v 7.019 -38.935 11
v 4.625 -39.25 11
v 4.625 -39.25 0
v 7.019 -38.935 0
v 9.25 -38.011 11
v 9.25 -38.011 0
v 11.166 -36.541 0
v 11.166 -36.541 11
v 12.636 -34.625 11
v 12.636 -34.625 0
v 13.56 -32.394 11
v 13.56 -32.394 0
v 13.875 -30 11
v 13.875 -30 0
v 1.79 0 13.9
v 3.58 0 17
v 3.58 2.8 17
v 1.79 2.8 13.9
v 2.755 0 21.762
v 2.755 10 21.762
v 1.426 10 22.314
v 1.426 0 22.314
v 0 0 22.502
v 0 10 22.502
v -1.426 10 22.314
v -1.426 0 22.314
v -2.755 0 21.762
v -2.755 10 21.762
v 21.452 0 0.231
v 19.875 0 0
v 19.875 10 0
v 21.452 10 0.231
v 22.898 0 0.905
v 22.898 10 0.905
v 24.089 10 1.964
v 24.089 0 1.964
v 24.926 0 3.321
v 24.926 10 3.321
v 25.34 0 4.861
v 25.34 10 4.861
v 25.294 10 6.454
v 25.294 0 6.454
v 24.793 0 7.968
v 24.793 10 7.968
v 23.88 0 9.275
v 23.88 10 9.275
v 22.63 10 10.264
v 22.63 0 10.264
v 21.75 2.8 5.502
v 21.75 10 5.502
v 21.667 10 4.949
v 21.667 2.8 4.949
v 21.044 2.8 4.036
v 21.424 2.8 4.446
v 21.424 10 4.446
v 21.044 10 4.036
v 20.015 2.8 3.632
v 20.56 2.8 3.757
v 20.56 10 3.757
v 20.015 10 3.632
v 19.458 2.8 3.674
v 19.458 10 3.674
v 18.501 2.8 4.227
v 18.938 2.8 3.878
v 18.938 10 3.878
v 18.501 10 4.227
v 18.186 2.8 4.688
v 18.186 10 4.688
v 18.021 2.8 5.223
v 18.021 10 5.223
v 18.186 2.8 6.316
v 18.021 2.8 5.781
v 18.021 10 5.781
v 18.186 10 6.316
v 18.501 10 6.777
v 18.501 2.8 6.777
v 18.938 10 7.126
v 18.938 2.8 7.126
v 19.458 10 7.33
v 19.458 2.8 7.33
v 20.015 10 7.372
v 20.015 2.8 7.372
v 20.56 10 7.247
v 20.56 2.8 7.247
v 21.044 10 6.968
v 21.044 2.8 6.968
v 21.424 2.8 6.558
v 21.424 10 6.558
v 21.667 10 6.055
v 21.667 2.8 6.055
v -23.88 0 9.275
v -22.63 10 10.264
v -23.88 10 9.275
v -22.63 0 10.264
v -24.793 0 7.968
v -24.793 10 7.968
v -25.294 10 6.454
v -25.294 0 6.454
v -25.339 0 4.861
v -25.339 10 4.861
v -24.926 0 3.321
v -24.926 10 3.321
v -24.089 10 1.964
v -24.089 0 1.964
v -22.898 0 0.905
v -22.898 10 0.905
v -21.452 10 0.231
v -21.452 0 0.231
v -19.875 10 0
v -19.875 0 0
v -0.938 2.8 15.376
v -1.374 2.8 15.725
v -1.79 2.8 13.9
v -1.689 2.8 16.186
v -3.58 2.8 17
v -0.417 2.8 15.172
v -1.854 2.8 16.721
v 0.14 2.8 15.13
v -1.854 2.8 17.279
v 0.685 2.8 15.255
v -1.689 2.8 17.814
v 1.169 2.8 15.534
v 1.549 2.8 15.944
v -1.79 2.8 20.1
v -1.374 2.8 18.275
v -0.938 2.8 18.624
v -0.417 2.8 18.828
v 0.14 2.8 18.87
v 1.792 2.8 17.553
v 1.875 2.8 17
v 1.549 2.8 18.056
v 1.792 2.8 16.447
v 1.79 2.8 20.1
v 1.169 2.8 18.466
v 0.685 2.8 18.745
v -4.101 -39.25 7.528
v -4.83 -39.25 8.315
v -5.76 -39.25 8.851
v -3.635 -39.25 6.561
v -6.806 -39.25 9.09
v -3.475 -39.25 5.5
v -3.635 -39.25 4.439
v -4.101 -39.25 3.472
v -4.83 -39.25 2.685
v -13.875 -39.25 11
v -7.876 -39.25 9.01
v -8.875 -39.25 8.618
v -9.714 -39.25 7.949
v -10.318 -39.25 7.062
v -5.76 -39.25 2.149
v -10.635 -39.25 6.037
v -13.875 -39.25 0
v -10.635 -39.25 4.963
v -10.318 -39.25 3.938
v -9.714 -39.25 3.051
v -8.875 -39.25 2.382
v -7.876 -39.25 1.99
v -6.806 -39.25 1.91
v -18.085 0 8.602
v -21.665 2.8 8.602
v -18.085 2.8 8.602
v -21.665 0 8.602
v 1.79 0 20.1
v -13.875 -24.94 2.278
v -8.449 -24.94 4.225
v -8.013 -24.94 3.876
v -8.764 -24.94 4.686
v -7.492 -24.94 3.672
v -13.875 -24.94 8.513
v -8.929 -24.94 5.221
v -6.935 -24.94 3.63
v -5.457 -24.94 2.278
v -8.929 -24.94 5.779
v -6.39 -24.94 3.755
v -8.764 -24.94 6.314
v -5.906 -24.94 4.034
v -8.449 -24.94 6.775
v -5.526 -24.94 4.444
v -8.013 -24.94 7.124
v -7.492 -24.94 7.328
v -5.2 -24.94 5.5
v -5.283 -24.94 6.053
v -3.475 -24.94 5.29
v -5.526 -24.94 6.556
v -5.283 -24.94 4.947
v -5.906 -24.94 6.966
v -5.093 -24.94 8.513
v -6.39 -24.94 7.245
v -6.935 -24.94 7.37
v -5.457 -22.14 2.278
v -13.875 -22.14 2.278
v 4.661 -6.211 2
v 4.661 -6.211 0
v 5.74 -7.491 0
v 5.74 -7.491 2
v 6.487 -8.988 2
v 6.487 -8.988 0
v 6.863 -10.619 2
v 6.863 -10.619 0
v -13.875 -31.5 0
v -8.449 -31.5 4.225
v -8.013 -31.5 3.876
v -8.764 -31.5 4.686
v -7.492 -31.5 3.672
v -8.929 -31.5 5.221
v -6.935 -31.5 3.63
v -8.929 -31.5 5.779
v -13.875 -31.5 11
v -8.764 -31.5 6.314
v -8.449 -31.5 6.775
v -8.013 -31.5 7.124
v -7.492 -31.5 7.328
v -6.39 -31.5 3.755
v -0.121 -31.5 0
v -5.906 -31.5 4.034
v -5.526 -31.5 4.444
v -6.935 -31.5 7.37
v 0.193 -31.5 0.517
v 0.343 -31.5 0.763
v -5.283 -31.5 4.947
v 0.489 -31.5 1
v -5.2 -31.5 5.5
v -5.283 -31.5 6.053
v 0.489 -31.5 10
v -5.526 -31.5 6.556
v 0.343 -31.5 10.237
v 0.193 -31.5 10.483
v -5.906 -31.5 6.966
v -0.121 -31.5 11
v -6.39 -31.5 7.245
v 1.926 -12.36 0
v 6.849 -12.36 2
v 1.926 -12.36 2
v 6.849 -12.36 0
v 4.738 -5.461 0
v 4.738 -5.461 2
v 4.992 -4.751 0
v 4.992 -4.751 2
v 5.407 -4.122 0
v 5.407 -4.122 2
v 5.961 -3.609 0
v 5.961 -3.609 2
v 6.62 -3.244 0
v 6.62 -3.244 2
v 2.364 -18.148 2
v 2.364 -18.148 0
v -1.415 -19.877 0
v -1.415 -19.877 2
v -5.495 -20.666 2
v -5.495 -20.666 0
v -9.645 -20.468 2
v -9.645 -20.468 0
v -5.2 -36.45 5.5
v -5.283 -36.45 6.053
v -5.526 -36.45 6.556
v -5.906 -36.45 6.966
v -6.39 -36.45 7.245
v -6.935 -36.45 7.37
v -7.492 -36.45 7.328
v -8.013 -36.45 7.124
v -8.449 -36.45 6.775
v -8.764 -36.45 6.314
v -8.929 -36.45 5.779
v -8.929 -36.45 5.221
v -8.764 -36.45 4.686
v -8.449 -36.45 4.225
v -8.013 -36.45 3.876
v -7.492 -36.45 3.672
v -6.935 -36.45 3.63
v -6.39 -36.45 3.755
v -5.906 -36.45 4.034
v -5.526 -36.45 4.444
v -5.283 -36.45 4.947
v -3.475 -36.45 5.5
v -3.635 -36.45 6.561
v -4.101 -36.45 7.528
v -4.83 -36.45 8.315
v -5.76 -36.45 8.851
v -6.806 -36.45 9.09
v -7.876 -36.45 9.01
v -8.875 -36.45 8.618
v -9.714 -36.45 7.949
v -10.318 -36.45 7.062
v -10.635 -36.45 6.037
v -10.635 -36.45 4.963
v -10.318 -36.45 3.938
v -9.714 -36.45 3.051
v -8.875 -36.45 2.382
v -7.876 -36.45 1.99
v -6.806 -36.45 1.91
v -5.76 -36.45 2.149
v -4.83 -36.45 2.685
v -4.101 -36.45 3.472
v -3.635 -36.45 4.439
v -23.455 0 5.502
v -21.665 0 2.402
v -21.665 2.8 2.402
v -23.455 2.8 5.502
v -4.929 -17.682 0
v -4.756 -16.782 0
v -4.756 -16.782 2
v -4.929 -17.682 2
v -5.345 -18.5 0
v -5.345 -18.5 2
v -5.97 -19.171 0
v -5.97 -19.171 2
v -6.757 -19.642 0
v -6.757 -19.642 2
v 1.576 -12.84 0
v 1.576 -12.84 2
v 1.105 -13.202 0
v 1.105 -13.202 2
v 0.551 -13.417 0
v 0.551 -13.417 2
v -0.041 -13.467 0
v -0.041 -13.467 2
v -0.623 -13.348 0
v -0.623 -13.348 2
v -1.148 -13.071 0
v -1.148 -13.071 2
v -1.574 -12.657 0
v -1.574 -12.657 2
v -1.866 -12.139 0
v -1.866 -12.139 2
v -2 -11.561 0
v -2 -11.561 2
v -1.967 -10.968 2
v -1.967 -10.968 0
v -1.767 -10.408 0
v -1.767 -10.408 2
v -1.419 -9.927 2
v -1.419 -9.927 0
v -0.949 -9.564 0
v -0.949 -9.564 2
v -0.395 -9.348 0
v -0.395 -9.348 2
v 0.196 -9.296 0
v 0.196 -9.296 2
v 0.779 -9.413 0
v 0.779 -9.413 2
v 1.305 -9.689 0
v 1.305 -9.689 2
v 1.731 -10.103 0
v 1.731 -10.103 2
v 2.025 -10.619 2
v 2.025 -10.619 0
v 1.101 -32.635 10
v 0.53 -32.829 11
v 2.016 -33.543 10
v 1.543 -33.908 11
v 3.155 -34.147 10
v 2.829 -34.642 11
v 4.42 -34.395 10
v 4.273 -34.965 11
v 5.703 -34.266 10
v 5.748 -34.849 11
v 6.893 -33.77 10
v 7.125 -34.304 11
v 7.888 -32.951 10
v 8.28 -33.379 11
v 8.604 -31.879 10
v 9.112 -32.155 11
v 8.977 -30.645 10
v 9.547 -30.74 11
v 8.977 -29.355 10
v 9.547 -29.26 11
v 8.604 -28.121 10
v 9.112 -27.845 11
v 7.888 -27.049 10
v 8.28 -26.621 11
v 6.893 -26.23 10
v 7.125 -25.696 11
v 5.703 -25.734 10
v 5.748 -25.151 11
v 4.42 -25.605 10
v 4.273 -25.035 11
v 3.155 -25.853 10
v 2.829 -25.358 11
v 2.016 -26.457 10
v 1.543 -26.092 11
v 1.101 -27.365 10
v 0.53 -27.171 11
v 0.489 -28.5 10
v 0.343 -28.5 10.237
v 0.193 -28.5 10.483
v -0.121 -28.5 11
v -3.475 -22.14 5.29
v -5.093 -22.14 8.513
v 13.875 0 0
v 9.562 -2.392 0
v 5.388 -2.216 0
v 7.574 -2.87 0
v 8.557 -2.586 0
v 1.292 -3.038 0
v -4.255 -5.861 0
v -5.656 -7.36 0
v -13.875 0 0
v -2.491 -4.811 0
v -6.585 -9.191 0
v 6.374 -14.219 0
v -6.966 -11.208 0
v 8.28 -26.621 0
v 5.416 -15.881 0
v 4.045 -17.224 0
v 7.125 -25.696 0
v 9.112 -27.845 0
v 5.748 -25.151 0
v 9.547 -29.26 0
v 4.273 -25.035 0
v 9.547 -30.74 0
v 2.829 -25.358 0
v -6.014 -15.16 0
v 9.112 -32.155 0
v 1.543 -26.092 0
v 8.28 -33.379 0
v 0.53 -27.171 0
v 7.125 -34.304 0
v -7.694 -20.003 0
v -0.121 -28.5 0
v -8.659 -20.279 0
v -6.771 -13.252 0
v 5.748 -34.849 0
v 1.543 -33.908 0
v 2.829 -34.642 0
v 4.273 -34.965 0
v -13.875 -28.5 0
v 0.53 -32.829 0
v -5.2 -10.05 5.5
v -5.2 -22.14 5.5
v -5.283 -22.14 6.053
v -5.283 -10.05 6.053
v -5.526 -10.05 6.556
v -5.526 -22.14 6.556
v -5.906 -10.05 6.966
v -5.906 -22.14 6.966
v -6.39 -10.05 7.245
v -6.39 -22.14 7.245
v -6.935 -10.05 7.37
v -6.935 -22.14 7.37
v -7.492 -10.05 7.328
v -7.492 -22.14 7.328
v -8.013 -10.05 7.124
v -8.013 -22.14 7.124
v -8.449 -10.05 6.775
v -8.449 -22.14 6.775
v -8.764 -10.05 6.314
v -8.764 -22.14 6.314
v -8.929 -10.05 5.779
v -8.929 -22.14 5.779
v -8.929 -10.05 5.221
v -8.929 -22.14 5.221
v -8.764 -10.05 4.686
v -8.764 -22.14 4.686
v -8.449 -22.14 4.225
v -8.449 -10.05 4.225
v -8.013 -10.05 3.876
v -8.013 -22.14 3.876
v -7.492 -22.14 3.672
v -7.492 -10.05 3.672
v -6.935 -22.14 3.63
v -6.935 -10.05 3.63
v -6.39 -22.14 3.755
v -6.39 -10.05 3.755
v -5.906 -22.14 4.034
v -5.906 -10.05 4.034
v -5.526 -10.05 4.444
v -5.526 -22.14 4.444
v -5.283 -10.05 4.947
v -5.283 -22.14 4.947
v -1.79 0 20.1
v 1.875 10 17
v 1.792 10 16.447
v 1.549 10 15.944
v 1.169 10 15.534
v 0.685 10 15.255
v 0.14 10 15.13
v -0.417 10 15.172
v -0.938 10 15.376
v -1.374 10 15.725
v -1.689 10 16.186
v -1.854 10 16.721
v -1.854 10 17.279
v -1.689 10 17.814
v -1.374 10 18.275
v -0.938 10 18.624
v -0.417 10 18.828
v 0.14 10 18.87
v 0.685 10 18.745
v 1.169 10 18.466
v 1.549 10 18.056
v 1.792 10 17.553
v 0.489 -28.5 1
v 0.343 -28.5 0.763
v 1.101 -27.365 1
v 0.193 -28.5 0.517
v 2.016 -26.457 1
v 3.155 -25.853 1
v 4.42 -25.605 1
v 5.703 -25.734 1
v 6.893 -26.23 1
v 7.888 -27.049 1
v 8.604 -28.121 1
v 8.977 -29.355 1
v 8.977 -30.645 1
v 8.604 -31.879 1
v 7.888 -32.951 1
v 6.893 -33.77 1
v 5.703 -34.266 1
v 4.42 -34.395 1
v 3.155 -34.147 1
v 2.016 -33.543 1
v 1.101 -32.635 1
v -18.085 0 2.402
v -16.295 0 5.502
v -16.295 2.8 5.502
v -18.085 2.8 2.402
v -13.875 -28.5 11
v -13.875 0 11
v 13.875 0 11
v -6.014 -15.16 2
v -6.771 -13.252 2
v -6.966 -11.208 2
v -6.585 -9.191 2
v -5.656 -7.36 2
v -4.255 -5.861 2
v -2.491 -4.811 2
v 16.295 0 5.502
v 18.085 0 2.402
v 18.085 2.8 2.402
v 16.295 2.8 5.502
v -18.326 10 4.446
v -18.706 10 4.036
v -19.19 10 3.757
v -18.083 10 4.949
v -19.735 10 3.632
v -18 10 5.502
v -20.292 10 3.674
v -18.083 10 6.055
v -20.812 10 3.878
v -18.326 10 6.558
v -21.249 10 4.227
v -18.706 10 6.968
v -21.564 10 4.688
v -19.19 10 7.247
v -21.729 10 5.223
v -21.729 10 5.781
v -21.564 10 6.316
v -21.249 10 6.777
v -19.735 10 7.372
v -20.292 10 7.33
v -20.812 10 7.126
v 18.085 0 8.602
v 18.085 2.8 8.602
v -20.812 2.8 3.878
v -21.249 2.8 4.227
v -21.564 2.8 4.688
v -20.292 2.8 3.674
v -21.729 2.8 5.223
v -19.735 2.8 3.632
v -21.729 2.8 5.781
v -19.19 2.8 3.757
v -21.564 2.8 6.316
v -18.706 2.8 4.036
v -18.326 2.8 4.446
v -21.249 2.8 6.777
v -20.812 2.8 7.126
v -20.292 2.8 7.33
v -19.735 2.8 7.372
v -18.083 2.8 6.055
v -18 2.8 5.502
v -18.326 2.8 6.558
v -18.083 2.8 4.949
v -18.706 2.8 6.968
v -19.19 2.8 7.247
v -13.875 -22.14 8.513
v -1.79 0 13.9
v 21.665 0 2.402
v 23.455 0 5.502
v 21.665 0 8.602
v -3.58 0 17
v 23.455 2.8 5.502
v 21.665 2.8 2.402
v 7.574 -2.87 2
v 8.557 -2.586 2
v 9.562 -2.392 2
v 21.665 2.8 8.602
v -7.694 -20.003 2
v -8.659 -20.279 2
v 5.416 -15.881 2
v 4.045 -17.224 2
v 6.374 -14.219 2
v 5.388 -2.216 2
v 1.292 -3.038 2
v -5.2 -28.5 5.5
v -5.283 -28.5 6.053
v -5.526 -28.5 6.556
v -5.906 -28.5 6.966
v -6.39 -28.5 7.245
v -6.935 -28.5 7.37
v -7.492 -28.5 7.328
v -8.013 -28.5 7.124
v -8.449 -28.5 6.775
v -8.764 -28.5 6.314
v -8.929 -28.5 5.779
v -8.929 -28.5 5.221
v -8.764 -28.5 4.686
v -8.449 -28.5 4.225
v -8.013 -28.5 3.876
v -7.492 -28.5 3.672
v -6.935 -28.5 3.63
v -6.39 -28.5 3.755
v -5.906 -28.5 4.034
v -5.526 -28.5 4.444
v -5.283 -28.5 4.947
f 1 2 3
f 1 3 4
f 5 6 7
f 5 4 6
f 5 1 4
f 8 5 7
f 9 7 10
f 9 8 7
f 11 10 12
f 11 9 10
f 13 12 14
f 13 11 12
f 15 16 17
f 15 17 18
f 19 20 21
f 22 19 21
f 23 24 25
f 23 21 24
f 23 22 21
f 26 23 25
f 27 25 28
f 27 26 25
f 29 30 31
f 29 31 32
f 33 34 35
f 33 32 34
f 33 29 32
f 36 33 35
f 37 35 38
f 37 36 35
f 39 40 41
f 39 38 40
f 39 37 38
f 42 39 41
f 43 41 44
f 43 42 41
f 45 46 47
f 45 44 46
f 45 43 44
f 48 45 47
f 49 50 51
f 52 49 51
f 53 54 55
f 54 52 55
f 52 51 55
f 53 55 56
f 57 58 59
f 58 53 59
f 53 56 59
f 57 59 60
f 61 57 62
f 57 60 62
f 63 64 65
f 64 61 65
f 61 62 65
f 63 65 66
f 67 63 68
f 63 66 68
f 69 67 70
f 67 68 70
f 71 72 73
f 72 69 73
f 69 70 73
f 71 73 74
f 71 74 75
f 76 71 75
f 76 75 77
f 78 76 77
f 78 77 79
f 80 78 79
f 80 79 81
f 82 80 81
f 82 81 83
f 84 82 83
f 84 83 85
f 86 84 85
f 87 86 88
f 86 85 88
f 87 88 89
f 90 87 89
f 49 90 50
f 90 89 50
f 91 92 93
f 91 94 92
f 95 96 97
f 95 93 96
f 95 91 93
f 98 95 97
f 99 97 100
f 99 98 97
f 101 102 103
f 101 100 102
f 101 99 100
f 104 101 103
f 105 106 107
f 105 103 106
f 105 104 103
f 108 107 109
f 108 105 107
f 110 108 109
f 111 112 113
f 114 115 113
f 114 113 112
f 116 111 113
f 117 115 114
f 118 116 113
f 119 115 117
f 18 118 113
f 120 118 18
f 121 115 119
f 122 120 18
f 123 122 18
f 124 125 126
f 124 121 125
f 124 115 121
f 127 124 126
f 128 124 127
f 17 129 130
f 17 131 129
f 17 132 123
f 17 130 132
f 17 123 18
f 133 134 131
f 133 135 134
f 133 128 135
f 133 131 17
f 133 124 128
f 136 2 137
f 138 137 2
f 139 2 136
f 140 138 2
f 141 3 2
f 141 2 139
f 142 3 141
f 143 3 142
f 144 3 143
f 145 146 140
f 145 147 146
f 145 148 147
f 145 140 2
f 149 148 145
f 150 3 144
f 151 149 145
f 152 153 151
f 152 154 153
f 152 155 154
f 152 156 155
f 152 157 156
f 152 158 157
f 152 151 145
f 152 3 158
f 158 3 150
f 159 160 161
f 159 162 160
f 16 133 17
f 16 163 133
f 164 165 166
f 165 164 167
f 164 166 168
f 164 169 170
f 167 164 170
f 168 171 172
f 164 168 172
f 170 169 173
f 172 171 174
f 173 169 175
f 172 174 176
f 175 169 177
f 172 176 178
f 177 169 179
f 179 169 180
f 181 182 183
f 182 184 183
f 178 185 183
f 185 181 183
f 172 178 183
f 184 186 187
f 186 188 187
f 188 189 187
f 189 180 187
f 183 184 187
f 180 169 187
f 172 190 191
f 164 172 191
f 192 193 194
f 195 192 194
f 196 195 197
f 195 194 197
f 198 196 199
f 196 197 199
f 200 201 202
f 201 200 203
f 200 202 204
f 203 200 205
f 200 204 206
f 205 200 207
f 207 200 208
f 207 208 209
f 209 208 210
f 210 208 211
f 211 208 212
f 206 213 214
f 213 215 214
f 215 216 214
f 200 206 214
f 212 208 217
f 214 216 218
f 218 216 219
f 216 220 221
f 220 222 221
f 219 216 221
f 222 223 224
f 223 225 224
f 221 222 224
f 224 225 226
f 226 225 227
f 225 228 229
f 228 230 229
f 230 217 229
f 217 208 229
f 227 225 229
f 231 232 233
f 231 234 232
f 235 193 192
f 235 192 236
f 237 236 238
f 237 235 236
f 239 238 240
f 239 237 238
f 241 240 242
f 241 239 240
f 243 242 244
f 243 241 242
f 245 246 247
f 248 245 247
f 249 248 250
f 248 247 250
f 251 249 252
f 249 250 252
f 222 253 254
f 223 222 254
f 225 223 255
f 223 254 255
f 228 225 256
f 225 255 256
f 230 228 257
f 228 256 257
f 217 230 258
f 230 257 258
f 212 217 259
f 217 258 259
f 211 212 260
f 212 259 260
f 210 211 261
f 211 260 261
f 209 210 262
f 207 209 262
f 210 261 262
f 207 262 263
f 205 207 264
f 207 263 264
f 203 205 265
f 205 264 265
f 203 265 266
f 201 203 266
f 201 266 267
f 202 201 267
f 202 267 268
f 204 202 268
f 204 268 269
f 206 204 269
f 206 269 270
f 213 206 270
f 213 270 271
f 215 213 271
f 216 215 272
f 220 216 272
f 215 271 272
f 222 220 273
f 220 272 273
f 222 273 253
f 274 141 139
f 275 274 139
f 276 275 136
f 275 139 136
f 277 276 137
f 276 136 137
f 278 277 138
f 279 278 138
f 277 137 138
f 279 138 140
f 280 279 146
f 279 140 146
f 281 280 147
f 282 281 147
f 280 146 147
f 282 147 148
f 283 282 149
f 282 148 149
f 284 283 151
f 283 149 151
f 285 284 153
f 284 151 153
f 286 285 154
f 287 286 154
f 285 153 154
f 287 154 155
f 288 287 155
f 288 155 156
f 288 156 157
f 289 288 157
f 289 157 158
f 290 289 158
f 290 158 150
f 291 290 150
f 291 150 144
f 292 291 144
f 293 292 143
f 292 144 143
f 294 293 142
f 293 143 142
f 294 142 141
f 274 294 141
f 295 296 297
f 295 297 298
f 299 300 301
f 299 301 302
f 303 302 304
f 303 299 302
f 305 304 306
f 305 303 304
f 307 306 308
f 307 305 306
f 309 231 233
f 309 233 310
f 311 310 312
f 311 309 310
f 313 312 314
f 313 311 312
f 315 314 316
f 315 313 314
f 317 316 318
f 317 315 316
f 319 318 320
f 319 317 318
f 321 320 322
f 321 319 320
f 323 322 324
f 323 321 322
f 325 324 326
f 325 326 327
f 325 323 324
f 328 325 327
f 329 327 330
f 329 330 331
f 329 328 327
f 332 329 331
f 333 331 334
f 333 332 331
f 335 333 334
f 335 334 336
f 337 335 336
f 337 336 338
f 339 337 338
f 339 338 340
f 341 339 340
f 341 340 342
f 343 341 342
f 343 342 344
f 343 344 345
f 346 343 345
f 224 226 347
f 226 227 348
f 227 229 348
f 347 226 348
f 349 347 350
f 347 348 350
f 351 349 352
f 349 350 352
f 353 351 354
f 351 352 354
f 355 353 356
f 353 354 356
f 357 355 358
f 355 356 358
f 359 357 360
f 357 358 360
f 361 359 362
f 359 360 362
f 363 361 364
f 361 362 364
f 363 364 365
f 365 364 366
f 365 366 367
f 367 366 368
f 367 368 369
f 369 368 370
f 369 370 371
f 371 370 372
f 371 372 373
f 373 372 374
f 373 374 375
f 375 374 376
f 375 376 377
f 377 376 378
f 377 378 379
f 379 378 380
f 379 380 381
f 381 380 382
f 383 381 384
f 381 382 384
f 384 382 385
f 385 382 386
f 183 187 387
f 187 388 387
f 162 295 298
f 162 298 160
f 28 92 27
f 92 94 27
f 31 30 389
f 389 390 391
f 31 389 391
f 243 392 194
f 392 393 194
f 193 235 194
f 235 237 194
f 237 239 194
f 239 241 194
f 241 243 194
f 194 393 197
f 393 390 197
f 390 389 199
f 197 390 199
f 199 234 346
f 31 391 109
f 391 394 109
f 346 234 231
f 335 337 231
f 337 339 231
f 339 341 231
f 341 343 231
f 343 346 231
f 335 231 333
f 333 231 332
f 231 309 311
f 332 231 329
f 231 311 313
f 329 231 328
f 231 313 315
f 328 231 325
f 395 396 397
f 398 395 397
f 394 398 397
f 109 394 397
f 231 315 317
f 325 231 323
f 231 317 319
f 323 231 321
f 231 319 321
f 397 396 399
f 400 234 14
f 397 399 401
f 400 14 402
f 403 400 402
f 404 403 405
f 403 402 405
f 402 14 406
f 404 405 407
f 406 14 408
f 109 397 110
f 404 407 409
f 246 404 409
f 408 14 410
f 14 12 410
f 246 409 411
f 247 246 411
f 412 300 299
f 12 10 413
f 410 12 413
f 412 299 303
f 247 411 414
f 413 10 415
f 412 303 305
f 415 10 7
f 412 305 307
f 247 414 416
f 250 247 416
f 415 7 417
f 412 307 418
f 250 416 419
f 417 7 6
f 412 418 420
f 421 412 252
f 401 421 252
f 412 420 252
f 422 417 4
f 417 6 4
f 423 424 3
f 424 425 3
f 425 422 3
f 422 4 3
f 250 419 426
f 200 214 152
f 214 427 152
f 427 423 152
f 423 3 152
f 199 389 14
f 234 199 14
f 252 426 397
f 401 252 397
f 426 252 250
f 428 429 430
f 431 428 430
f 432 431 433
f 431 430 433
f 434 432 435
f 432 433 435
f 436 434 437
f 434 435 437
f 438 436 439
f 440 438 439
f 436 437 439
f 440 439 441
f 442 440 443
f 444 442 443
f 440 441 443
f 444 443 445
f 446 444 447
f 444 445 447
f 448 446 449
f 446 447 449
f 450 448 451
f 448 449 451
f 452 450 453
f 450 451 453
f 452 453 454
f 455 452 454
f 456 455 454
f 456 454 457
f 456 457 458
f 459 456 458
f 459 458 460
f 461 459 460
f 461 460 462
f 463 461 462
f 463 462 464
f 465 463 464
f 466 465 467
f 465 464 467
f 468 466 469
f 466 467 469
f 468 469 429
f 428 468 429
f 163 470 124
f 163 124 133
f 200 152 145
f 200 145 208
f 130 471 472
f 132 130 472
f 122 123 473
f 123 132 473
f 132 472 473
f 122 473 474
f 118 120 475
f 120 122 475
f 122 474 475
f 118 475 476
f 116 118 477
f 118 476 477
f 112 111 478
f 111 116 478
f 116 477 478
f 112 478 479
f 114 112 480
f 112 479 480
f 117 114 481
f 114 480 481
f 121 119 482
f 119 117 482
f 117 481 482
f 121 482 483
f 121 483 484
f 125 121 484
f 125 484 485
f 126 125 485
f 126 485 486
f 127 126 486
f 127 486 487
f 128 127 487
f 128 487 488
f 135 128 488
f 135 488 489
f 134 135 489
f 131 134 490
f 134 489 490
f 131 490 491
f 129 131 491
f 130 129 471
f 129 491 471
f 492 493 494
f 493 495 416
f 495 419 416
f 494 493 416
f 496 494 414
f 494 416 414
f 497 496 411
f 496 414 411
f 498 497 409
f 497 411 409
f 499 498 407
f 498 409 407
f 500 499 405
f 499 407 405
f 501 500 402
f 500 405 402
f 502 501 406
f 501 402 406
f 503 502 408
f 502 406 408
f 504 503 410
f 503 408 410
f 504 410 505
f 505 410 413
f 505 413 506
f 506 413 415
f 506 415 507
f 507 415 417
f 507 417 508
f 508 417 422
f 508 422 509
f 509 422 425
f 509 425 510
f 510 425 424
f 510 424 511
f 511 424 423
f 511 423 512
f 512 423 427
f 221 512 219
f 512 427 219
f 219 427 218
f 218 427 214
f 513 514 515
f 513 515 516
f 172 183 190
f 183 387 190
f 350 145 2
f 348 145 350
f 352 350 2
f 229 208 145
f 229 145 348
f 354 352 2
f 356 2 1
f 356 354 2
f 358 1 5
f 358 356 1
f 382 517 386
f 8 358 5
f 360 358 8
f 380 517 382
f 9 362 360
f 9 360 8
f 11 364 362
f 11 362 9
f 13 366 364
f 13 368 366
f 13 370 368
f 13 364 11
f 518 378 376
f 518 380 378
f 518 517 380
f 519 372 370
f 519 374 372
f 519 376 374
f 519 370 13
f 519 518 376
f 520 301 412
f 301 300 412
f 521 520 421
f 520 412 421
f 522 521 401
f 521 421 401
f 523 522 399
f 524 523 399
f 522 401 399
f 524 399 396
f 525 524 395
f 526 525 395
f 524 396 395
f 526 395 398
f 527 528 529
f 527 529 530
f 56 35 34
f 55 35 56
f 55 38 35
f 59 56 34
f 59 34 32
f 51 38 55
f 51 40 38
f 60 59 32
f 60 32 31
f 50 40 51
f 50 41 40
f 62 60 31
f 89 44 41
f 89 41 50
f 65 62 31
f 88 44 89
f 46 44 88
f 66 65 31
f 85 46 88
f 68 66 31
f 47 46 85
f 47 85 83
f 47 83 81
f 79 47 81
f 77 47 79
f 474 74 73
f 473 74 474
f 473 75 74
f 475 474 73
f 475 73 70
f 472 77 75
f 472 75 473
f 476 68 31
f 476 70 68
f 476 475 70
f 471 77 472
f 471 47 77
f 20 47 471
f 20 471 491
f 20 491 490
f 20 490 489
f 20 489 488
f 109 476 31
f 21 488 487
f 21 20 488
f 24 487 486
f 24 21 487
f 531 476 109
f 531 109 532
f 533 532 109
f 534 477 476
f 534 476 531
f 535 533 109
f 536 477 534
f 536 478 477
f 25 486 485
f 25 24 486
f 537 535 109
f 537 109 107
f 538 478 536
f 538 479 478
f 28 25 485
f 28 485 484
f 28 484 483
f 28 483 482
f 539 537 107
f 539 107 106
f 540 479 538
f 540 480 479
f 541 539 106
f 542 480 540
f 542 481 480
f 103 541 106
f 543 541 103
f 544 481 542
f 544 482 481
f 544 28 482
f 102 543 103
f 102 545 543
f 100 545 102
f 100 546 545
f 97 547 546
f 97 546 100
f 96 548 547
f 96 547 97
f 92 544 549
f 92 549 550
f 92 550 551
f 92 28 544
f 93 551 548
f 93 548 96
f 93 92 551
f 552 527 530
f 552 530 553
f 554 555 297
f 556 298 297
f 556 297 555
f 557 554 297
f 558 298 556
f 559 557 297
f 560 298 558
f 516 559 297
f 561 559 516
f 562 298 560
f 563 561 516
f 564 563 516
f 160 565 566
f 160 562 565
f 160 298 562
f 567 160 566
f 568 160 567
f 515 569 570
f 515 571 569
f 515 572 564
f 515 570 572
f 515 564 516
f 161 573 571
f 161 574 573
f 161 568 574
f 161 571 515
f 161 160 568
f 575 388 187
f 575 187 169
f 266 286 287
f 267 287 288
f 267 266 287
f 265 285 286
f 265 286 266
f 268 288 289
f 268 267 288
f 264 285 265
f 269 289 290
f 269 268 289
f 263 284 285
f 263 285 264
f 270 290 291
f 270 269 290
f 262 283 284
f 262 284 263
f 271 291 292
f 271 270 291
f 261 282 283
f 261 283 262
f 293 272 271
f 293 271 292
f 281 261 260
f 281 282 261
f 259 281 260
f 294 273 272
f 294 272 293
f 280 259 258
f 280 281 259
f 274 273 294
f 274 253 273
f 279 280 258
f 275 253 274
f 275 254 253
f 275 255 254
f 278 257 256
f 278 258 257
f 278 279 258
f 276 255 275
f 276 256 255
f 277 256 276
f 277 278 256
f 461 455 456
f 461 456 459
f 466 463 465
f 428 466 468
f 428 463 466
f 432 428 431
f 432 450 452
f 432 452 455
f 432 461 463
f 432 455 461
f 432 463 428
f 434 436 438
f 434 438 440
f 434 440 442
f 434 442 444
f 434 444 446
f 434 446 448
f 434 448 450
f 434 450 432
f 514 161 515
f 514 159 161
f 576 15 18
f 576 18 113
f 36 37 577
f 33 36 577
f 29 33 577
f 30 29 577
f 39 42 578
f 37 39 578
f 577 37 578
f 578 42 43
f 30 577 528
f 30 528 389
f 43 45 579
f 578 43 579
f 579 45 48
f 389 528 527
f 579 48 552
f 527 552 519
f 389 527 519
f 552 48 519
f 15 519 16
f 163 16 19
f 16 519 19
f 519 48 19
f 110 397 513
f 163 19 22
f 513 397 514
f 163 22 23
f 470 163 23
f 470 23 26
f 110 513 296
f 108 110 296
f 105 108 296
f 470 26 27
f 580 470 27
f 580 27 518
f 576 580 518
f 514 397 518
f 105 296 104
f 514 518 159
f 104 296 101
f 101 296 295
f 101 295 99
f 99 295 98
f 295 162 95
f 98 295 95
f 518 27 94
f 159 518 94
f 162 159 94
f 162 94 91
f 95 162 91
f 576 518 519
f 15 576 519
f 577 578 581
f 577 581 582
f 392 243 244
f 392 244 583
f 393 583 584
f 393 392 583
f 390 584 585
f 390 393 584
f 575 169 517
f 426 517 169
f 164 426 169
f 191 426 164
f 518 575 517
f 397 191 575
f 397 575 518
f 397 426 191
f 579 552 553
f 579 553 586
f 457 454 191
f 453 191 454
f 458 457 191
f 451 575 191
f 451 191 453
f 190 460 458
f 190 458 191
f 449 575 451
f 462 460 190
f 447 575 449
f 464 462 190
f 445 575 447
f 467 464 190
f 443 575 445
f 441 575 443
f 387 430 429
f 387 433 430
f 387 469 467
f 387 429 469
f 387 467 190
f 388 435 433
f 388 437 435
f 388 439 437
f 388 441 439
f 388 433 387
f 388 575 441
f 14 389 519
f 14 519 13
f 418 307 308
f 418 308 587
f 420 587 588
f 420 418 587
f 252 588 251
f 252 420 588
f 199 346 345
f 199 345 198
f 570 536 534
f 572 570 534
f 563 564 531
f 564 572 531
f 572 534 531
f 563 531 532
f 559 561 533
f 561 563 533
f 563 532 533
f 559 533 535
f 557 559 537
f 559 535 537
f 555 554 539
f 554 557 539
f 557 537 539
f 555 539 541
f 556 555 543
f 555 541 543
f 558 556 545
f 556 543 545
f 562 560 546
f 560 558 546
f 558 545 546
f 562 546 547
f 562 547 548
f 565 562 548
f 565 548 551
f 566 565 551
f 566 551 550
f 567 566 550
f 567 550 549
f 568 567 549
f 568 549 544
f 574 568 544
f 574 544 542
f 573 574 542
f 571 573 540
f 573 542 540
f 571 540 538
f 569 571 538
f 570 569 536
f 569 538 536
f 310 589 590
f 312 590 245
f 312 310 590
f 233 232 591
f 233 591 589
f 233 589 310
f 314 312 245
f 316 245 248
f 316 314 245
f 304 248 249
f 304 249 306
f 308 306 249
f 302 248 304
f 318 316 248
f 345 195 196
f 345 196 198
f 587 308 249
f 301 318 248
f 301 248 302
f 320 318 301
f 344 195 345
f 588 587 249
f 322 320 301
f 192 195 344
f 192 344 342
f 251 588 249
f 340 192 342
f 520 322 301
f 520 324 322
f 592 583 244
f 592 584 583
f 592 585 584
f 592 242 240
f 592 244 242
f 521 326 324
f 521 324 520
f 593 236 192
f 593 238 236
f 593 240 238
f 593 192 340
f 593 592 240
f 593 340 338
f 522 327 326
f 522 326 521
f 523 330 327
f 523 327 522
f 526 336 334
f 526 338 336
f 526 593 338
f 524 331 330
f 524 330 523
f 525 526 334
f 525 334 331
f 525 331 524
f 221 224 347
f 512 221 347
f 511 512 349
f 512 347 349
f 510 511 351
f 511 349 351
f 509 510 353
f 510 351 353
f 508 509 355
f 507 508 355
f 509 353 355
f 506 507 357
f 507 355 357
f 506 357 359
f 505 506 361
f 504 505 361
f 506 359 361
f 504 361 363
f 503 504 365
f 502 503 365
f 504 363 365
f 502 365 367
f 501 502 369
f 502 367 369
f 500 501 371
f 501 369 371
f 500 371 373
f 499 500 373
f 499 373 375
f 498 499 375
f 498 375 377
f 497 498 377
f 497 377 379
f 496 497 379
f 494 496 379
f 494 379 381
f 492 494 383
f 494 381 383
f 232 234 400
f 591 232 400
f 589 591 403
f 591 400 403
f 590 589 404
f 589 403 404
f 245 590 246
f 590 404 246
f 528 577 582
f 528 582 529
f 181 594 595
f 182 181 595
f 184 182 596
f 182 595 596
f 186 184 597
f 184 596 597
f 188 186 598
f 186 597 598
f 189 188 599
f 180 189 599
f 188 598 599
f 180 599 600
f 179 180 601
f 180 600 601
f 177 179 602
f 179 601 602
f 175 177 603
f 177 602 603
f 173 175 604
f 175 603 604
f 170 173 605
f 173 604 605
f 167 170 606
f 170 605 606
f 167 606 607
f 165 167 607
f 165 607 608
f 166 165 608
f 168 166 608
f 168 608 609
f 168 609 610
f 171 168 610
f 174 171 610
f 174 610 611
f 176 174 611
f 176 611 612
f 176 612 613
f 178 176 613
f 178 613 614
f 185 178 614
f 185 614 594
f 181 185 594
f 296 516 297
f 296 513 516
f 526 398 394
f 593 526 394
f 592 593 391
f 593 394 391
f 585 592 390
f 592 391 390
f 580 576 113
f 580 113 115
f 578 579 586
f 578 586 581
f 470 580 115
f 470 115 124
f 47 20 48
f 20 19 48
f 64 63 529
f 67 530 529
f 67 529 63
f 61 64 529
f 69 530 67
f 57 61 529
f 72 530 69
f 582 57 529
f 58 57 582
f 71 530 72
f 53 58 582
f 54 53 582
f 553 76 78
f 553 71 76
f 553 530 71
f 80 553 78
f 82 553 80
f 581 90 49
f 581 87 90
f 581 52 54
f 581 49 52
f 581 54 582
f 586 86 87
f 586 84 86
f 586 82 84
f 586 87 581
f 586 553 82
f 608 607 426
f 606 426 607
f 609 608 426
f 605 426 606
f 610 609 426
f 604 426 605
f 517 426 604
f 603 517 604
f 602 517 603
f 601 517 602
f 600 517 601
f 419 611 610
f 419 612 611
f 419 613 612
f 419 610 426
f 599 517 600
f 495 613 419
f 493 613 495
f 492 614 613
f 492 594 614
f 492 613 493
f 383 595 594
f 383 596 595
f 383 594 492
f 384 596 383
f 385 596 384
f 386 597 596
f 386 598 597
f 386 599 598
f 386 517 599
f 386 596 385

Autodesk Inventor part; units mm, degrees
sketch "Boceto1" plane through (0, 0, 0) normal (0, 0, 1) x (1, 0, 0)
  line L0 (-13.875, 0) -> (13.875, 0)
  line L1 (13.875, 0) -> (13.875, -39.25)
  line L2 (13.875, -39.25) -> (-13.875, -39.25)
  line L3 (-13.875, -39.25) -> (-13.875, 0)
  point P0 (0, 0)
  point P1 (0, 0)
  dimension "d0" = 27.75
  dimension "d1" = 39.25
extrude "Extrusión1" add sketch "Boceto1" along normal blind 11
fillet "Empalme1" radius 9.25 1 edges at (13.875, -39.25, 5.5)
sketch "Boceto2" plane through (0, 0, 11) normal (0, 0, 1) x (1, 0, 0)
  arc A0 (4.625, -39.25) -> (13.875, -30) centre (4.625, -30) ccw projected
  line L0 (13.875, -30) -> (13.875, 0) projected
  line L1 (13.875, 0) -> (-13.875, 0) projected
  line L2 (-13.875, 0) -> (-13.875, -39.25) projected
  line L3 (-13.875, -39.25) -> (4.625, -39.25) projected
  line L4 (-13.875, 0) -> (-13.875, -39.25) projected
  line L5 (-13.875, -31.5) -> (0.4886, -31.5)
  line L6 (-13.875, -28.5) -> (0.4886, -28.5)
  arc A1 (0.4886, -31.5) -> (0.4886, -28.5) centre (4.625, -30) ccw
  point P0 (0, 0)
  dimension "d5" = 3
  dimension "d6" = 7.75
  dimension "d13" = 1.5
  dimension "d62" = 4.4
  dimension "d63" = 9.25
extrude "Extrusión2" cut sketch "Boceto2" against normal blind 11 contours L2 L6 A1 L5
sketch "Boceto3" plane through (0, 0, 0) normal (0, 1, 0) x (-1, 0, 0)
  line L0 (-19.875, 0) -> (19.875, 0)
  line L1 (22.6302, 10.2645) -> (2.7552, 21.7625)
  line L2 (-2.7552, 21.7625) -> (-22.6302, 10.2645)
  line L3 (13.875, 0) -> (-13.875, 0) projected
  arc A0 (-22.6302, 10.2645) -> (-19.875, 0) centre (-19.875, 5.502) ccw
  arc A1 (19.875, 0) -> (22.6302, 10.2645) centre (19.875, 5.502) ccw
  arc A2 (2.7552, 21.7625) -> (-2.7552, 21.7625) centre (0, 17) ccw
  point P0 (0, 0)
  point P1 (0, 23.3564)
  point P2 (0, 0)
  point P3 (0, 0)
  point P4 (0, 0)
  point P5 (0, 0)
  dimension "d21" = 30.05
  dimension "d23" = 39.75
  dimension "d25" = 17
extrude "Extrusión3" add sketch "Boceto3" along normal blind 10
ref_plane "Plano de trabajo2" through (0, 7.2, 0) normal (0, 1, 0) x (1, 0, 0)
sketch "Boceto5" plane through (0, 7.2, 0) normal (0, 1, 0) x (1, 0, 0)
  line L0 (19.875, 0) -> (-19.875, 0) projected
  arc A0 (-19.875, 0) -> (-22.6302, -10.2645) centre (-19.875, -5.502) ccw projected
  line L1 (-22.6302, -10.2645) -> (-2.7552, -21.7625) projected
  arc A1 (-2.7552, -21.7625) -> (2.7552, -21.7625) centre (0, -17) ccw projected
  line L2 (2.7552, -21.7625) -> (22.6302, -10.2645) projected
  arc A2 (22.6302, -10.2645) -> (19.875, 0) centre (19.875, -5.502) ccw projected
  circle A3 centre (19.875, -5.502) radius 1.875
  circle A4 centre (0, -17) radius 1.875
  circle A5 centre (-19.875, -5.502) radius 1.875
  point P0 (0, 0)
  dimension "d33" = 3.75
  dimension "d34" = 3.75
  dimension "d35" = 3.75
extrude "Extrusión5" cut sketch "Boceto5" along normal through all both and the other way through all contours A3 | A4 | A5
sketch "Boceto6" plane through (0, 0, 0) normal (0, -1, 0) x (1, 0, 0)
  circle A0 centre (0, 17) radius 1.875 projected
  circle A1 centre (19.875, 5.502) radius 1.875 projected
  circle A2 centre (-19.875, 5.502) radius 1.875 projected
  line L0 (13.875, 0) -> (13.875, 11) projected
  line L1 (19.875, 0) -> (13.875, 0) projected
  arc A3 (19.875, 0) -> (22.6302, 10.2645) centre (19.875, 5.502) ccw projected
  line L2 (2.7552, 21.7625) -> (22.6302, 10.2645) projected
  arc A4 (2.7552, 21.7625) -> (-2.7552, 21.7625) centre (0, 17) ccw projected
  line L3 (-22.6302, 10.2645) -> (-2.7552, 21.7625) projected
  arc A5 (-22.6302, 10.2645) -> (-19.875, 0) centre (-19.875, 5.502) ccw projected
  line L4 (-13.875, 0) -> (-19.875, 0) projected
  line L5 (-13.875, 0) -> (-13.875, 11) projected
  line L6 (13.875, 11) -> (-13.875, 11) projected
  line L7 (-18.0852, 8.602) -> (-16.2954, 5.502)
  line L8 (-16.2954, 5.502) -> (-18.0852, 2.402)
  line L9 (-18.0852, 2.402) -> (-21.6648, 2.402)
  line L10 (-21.6648, 2.402) -> (-23.4546, 5.502)
  line L11 (-23.4546, 5.502) -> (-21.6648, 8.602)
  line L12 (-21.6648, 8.602) -> (-18.0852, 8.602)
  line L13 (1.7898, 20.1) -> (3.5796, 17)
  line L14 (3.5796, 17) -> (1.7898, 13.9)
  line L15 (1.7898, 13.9) -> (-1.7898, 13.9)
  line L16 (-1.7898, 13.9) -> (-3.5796, 17)
  line L17 (-3.5796, 17) -> (-1.7898, 20.1)
  line L18 (-1.7898, 20.1) -> (1.7898, 20.1)
  line L19 (18.0852, 8.602) -> (21.6648, 8.602)
  line L20 (21.6648, 8.602) -> (23.4546, 5.502)
  line L21 (23.4546, 5.502) -> (21.6648, 2.402)
  line L22 (21.6648, 2.402) -> (18.0852, 2.402)
  line L23 (18.0852, 2.402) -> (16.2954, 5.502)
  line L24 (16.2954, 5.502) -> (18.0852, 8.602)
  point P0 (0, 0)
  dimension "d38" = 6.2
  dimension "d39" = 6.2
  dimension "d40" = 6.2
extrude "Extrusión6" cut sketch "Boceto6" against normal blind 2.8 contours L7 L8 L9 L10 L11 L12 | L13 L14 L15 L16 L17 L18 | L19 L20 L21 L22 L23 L24
sketch "Boceto7" plane through (-13.875, -39.25, 0) normal (0, -1, 0) x (1, 0, 0)
  circle A0 centre (6.8, 5.5) radius 3.6
  line L0 (18.5, 0) -> (0, 0) projected
  line L1 (0, 0) -> (0, 11) projected
  point P0 (13.875, 0)
  dimension "d43" = 7.2
  dimension "d44" = 5.5
  dimension "d45" = 6.8
extrude "Extrusión7" cut sketch "Boceto7" against normal blind 2.8
sketch "Boceto8" plane through (-7.075, -36.45, 5.5) normal (0, -1, 0) x (1, 0, 0)
  circle A0 centre (0, 0) radius 3.6 projected
  circle A1 centre (0, 0) radius 1.875
  point P0 (7.075, -5.5)
  dimension "d48" = 3.75
extrude "Extrusión8" cut sketch "Boceto8" against normal blind 26.4 contours A1
ref_plane "Plano de trabajo3" through (-13.875, -23.54, 0) normal (0, -1, 0) x (1, 0, 0)
sketch "Boceto9" plane through (-13.875, -23.54, 0) normal (0, -1, 0) x (1, 0, 0)
  circle A0 centre (6.8, 5.5) radius 1.875 projected
  line L0 (27.75, 11) -> (0, 11) projected
  line L1 (0, 0) -> (0, 11) projected
  line L2 (-21.6528, 0) -> (49.4028, 0) projected
  line L3 (8.7816, 8.5126) -> (10.3998, 5.2902)
  line L4 (10.3998, 5.2902) -> (8.4182, 2.2776)
  line L5 (8.7816, 8.5126) -> (0, 8.5126)
  line L6 (8.4182, 2.2776) -> (0, 2.2776)
  point P0 (13.875, 0)
  dimension "d53" = 120
  dimension "d56" = 6.235
  dimension "d57" = 8.7816
extrude "Extrusión9" cut sketch "Boceto9" along normal mid plane 2.8
sketch "Boceto10" plane through (0, 0, 0) normal (0, 0, -1) x (-1, 0, 0)
  line L0 (-6.6202, -3.2438) -> (-7.3905, -2.9152) construction
  line L1 (-8.0553, -2.0944) -> (-6.2205, -2.0944) construction
  line L2 (-7.3905, -2.9152) -> (-8.2942, -2.6479) construction
  line L3 (-8.8708, -2.1991) -> (-8.0553, -2.0944) construction
  line L4 (-8.2942, -2.6479) -> (-9.3576, -2.433) construction
  line L5 (-9.521, -2.3562) -> (-8.8708, -2.1991) construction
  line L6 (-9.5623, -2.392) -> (-9.521, -2.3562) construction
  line L7 (-9.3576, -2.433) -> (-9.5623, -2.392) construction
  arc A0 (-6.6202, -3.2438) -> (-9.5623, -2.392) centre (-11.1752, -13.4701) ccw
  line L8 (-4.1904, -17.1175) -> (-4.9646, -16.4122) construction
  line L9 (-2.3638, -18.1479) -> (-2.8515, -17.944) construction
  line L10 (-2.2067, -18.1953) -> (-2.372, -18.0796) construction
  line L11 (-6.5651, -9.2139) -> (-6.3061, -8.5334) construction
  line L12 (-6.7552, -9.9275) -> (-6.5651, -9.2139) construction
  line L13 (-6.8626, -10.619) -> (-6.7552, -9.9275) construction
  line L14 (-6.3061, -8.5334) -> (-5.981, -7.886) construction
  line L15 (-5.981, -7.886) -> (-5.5953, -7.2826) construction
  line L16 (-5.5953, -7.2826) -> (-5.1545, -6.7234) construction
  line L17 (-4.6724, -6.0787) -> (-4.733, -5.5552) construction
  line L18 (-4.6614, -6.2109) -> (-4.6724, -6.0787) construction
  line L19 (-5.1545, -6.7234) -> (-4.6614, -6.2109) construction
  arc A1 (-4.6614, -6.2109) -> (-6.8626, -10.619) centre (0.1756, -11.3801) ccw
  line L20 (-6.8489, -12.3602) -> (-1.9257, -12.3602)
  line L21 (-2.0248, -10.619) -> (-6.8626, -10.619) construction
  line L22 (-2.0248, -10.619) -> (-6.8626, -10.619)
  line L23 (-3.3198, -17.7016) -> (-3.7661, -17.4261) construction
  line L24 (-3.7661, -17.4261) -> (-4.1904, -17.1175) construction
  line L25 (-2.8515, -17.944) -> (-3.3198, -17.7016) construction
  line L26 (-4.9646, -16.4122) -> (-5.6285, -15.594) construction
  line L27 (-5.6285, -15.594) -> (-5.9123, -15.1504) construction
  line L28 (-5.9123, -15.1504) -> (-6.1658, -14.682) construction
  arc A2 (-6.8489, -12.3602) -> (-2.3638, -18.1479) centre (0.1619, -11.559) ccw
  line L29 (-6.1658, -14.682) -> (-6.3834, -14.1944) construction
  line L30 (-0.5371, -13.4071) -> (-0.1239, -13.4484) construction
  line L31 (-0.9228, -13.2858) -> (-0.5371, -13.4071) construction
  line L32 (-1.2727, -13.0985) -> (-0.9228, -13.2858) construction
  line L33 (-6.8489, -12.3602) -> (-1.9257, -12.3602) construction
  line L34 (-6.3834, -14.1944) -> (-6.568, -13.6847) construction
  line L35 (-6.568, -13.6847) -> (-6.7112, -13.1613) construction
  line L36 (-6.7112, -13.1613) -> (-6.8268, -12.553) construction
  line L37 (-6.8268, -12.553) -> (-6.8489, -12.3602) construction
  line L38 (1.5815, -12.542) -> (1.7688, -12.1921) construction
  line L39 (1.025, -13.0985) -> (1.328, -12.845) construction
  line L40 (0.6751, -13.2858) -> (1.025, -13.0985) construction
  line L41 (0.2894, -13.4071) -> (0.6751, -13.2858) construction
  line L42 (-0.1239, -13.4484) -> (0.2894, -13.4071) construction
  line L43 (1.328, -12.845) -> (1.5815, -12.542) construction
  line L44 (1.328, -9.9412) -> (1.025, -9.6905) construction
  line L45 (1.025, -9.6905) -> (0.6751, -9.5004) construction
  line L46 (1.7688, -10.5942) -> (1.5815, -10.2443) construction
  line L47 (1.5815, -10.2443) -> (1.328, -9.9412) construction
  line L48 (1.89, -10.9799) -> (1.7688, -10.5942) construction
  line L49 (0.6751, -9.5004) -> (0.2894, -9.382) construction
  line L50 (1.9314, -11.3931) -> (1.89, -10.9799) construction
  line L51 (0.2894, -9.382) -> (-0.1239, -9.3406) construction
  line L52 (-1.9257, -12.3602) -> (-1.8292, -12.542) construction
  line L53 (-1.8292, -12.542) -> (-1.5758, -12.845) construction
  line L54 (-1.5758, -12.845) -> (-1.2727, -13.0985) construction
  line L55 (1.89, -11.8064) -> (1.9314, -11.3931) construction
  line L56 (1.7688, -12.1921) -> (1.89, -11.8064) construction
  arc A3 (-1.9257, -12.3602) -> (-2.0248, -10.619) centre (-0.0805, -11.3816) ccw
  line L57 (-2.6748, -2.6372) -> (-1.5397, -2.9457) construction
  arc A4 (2.4908, -4.8109) -> (-9.5623, -2.392) centre (-6.7465, -19.6002) ccw
  line L58 (-3.8457, -2.3892) -> (-2.6748, -2.6372) construction
  line L59 (-5.9617, -3.6405) -> (-6.6202, -3.2438) construction
  line L60 (-5.5678, -3.9821) -> (-5.9617, -3.6405) construction
  line L61 (-6.2205, -2.0944) -> (-5.0331, -2.2074) construction
  line L62 (-5.2317, -4.3596) -> (-5.5678, -3.9821) construction
  line L63 (-5.0002, -4.7342) -> (-5.2317, -4.3596) construction
  arc A5 (-4.6614, -6.2109) -> (-6.6202, -3.2438) centre (-7.8027, -6.1546) ccw
  line L64 (-4.8377, -5.1199) -> (-5.0002, -4.7342) construction
  line L65 (-4.733, -5.5552) -> (-4.8377, -5.1199) construction
  line L66 (-5.0331, -2.2074) -> (-3.8457, -2.3892) construction
  line L67 (1.477, -4.1745) -> (2.2925, -4.6676) construction
  line L68 (0.5541, -3.7199) -> (1.477, -4.1745) construction
  line L69 (-0.457, -3.3094) -> (0.5541, -3.7199) construction
  line L70 (-1.5397, -2.9457) -> (-0.457, -3.3094) construction
  line L71 (2.2925, -4.6676) -> (2.4908, -4.8109) construction
  line L72 (4.7417, -16.6134) -> (4.7555, -16.7815) construction
  line L73 (5.2266, -16.1038) -> (4.7417, -16.6134) construction
  line L74 (6.0393, -14.9466) -> (5.6619, -15.5472) construction
  line L75 (2.4908, -4.8109) -> (2.9702, -5.0203) construction
  line L76 (2.9702, -5.0203) -> (3.4331, -5.2627) construction
  line L77 (3.4331, -5.2627) -> (4.2899, -5.8495) construction
  line L78 (4.2899, -5.8495) -> (5.0502, -6.5548) construction
  line L79 (5.0502, -6.5548) -> (5.7032, -7.3676) construction
  line L80 (5.7032, -7.3676) -> (6.2321, -8.2767) construction
  line L81 (6.2321, -8.2767) -> (6.447, -8.7616) construction
  arc A6 (4.7555, -16.7815) -> (2.4908, -4.8109) centre (-0.321, -11.5424) ccw
  line L82 (6.3589, -14.3047) -> (6.0393, -14.9466) construction
  line L83 (5.6619, -15.5472) -> (5.2266, -16.1038) construction
  line L84 (6.447, -8.7616) -> (6.6261, -9.2658) construction
  line L85 (4.8161, -17.305) -> (4.9235, -17.7402) construction
  line L86 (4.9235, -17.7402) -> (5.0861, -18.126) construction
  line L87 (4.7555, -16.7815) -> (4.8161, -17.305) construction
  line L88 (5.0861, -18.126) -> (5.3175, -18.5006) construction
  line L89 (5.3175, -18.5006) -> (5.6536, -18.8781) construction
  line L90 (5.6536, -18.8781) -> (6.0986, -19.2458) construction
  line L91 (6.2225, -20.7819) -> (5.0379, -20.669) construction
  arc A7 (4.7555, -16.7815) -> (6.757, -19.6425) centre (8.0368, -16.6165) ccw
  line L92 (6.0986, -19.2458) -> (6.757, -19.6425) construction
  line L93 (7.1537, -20.7985) -> (6.2225, -20.7819) construction
  line L94 (6.757, -19.6425) -> (7.4717, -19.9448) construction
  line L95 (6.6261, -9.2658) -> (6.7694, -9.7837) construction
  line L96 (6.7694, -9.7837) -> (6.8713, -10.321) construction
  line L97 (6.9347, -10.8692) -> (6.9567, -11.4312) construction
  line L98 (6.9567, -11.4312) -> (6.9181, -12.1889) construction
  line L99 (6.9181, -12.1889) -> (6.8024, -12.9245) construction
  line L100 (6.8024, -12.9245) -> (6.6151, -13.6297) construction
  line L101 (6.6151, -13.6297) -> (6.3589, -14.3047) construction
  line L102 (6.8713, -10.321) -> (6.9347, -10.8692) construction
  line L103 (7.4717, -19.9448) -> (8.3753, -20.212) construction
  arc A8 (6.757, -19.6425) -> (9.6454, -20.4682) centre (11.2767, -9.2971) ccw
  line L104 (8.3753, -20.212) -> (9.4388, -20.4269) construction
  line L105 (9.4388, -20.4269) -> (9.6454, -20.4682) construction
  line L106 (8.1384, -20.7658) -> (7.2348, -20.785) construction
  line L107 (8.9539, -20.6611) -> (8.1384, -20.7658) construction
  line L108 (9.6041, -20.504) -> (8.9539, -20.6611) construction
  line L109 (9.6454, -20.4682) -> (9.6041, -20.504) construction
  line L110 (5.0379, -20.669) -> (3.8505, -20.4872) construction
  line L111 (3.8505, -20.4872) -> (2.6796, -20.2392) construction
  arc A9 (-2.3638, -18.1479) -> (9.6454, -20.4682) centre (6.7458, -3.2373) ccw
  line L112 (2.6796, -20.2392) -> (1.5445, -19.9306) construction
  line L113 (0.5428, -19.5535) -> (-0.4683, -19.143) construction
  line L114 (-0.4683, -19.143) -> (-1.3912, -18.6885) construction
  line L115 (-1.3912, -18.6885) -> (-2.2067, -18.1953) construction
  line L116 (1.6255, -19.9172) -> (0.5428, -19.5535) construction
  line L117 (-2.0166, -10.5942) -> (-2.0248, -10.619) construction
  line L118 (-1.8292, -10.2443) -> (-2.0166, -10.5942) construction
  line L119 (-1.5758, -9.9412) -> (-1.8292, -10.2443) construction
  line L120 (-1.2727, -9.6905) -> (-1.5758, -9.9412) construction
  line L121 (-0.9228, -9.5004) -> (-1.2727, -9.6905) construction
  line L122 (-0.5371, -9.382) -> (-0.9228, -9.5004) construction
  line L123 (-0.1239, -9.3406) -> (-0.5371, -9.382) construction
  point P0 (0, 0)
extrude "Extrusión10" cut sketch "Boceto10" against normal blind 2
sketch "Boceto11" plane through (0, 2.8, 0) normal (0, -1, 0) x (1, 0, 0)
  point P0 (0, 0)
chamfer "Chamfer1" distance 1 angle 30 2 edges at (9.025, -30, 0) (9.025, -30, 11) measured on face at (8.0232, -32.795, 3.6667)
